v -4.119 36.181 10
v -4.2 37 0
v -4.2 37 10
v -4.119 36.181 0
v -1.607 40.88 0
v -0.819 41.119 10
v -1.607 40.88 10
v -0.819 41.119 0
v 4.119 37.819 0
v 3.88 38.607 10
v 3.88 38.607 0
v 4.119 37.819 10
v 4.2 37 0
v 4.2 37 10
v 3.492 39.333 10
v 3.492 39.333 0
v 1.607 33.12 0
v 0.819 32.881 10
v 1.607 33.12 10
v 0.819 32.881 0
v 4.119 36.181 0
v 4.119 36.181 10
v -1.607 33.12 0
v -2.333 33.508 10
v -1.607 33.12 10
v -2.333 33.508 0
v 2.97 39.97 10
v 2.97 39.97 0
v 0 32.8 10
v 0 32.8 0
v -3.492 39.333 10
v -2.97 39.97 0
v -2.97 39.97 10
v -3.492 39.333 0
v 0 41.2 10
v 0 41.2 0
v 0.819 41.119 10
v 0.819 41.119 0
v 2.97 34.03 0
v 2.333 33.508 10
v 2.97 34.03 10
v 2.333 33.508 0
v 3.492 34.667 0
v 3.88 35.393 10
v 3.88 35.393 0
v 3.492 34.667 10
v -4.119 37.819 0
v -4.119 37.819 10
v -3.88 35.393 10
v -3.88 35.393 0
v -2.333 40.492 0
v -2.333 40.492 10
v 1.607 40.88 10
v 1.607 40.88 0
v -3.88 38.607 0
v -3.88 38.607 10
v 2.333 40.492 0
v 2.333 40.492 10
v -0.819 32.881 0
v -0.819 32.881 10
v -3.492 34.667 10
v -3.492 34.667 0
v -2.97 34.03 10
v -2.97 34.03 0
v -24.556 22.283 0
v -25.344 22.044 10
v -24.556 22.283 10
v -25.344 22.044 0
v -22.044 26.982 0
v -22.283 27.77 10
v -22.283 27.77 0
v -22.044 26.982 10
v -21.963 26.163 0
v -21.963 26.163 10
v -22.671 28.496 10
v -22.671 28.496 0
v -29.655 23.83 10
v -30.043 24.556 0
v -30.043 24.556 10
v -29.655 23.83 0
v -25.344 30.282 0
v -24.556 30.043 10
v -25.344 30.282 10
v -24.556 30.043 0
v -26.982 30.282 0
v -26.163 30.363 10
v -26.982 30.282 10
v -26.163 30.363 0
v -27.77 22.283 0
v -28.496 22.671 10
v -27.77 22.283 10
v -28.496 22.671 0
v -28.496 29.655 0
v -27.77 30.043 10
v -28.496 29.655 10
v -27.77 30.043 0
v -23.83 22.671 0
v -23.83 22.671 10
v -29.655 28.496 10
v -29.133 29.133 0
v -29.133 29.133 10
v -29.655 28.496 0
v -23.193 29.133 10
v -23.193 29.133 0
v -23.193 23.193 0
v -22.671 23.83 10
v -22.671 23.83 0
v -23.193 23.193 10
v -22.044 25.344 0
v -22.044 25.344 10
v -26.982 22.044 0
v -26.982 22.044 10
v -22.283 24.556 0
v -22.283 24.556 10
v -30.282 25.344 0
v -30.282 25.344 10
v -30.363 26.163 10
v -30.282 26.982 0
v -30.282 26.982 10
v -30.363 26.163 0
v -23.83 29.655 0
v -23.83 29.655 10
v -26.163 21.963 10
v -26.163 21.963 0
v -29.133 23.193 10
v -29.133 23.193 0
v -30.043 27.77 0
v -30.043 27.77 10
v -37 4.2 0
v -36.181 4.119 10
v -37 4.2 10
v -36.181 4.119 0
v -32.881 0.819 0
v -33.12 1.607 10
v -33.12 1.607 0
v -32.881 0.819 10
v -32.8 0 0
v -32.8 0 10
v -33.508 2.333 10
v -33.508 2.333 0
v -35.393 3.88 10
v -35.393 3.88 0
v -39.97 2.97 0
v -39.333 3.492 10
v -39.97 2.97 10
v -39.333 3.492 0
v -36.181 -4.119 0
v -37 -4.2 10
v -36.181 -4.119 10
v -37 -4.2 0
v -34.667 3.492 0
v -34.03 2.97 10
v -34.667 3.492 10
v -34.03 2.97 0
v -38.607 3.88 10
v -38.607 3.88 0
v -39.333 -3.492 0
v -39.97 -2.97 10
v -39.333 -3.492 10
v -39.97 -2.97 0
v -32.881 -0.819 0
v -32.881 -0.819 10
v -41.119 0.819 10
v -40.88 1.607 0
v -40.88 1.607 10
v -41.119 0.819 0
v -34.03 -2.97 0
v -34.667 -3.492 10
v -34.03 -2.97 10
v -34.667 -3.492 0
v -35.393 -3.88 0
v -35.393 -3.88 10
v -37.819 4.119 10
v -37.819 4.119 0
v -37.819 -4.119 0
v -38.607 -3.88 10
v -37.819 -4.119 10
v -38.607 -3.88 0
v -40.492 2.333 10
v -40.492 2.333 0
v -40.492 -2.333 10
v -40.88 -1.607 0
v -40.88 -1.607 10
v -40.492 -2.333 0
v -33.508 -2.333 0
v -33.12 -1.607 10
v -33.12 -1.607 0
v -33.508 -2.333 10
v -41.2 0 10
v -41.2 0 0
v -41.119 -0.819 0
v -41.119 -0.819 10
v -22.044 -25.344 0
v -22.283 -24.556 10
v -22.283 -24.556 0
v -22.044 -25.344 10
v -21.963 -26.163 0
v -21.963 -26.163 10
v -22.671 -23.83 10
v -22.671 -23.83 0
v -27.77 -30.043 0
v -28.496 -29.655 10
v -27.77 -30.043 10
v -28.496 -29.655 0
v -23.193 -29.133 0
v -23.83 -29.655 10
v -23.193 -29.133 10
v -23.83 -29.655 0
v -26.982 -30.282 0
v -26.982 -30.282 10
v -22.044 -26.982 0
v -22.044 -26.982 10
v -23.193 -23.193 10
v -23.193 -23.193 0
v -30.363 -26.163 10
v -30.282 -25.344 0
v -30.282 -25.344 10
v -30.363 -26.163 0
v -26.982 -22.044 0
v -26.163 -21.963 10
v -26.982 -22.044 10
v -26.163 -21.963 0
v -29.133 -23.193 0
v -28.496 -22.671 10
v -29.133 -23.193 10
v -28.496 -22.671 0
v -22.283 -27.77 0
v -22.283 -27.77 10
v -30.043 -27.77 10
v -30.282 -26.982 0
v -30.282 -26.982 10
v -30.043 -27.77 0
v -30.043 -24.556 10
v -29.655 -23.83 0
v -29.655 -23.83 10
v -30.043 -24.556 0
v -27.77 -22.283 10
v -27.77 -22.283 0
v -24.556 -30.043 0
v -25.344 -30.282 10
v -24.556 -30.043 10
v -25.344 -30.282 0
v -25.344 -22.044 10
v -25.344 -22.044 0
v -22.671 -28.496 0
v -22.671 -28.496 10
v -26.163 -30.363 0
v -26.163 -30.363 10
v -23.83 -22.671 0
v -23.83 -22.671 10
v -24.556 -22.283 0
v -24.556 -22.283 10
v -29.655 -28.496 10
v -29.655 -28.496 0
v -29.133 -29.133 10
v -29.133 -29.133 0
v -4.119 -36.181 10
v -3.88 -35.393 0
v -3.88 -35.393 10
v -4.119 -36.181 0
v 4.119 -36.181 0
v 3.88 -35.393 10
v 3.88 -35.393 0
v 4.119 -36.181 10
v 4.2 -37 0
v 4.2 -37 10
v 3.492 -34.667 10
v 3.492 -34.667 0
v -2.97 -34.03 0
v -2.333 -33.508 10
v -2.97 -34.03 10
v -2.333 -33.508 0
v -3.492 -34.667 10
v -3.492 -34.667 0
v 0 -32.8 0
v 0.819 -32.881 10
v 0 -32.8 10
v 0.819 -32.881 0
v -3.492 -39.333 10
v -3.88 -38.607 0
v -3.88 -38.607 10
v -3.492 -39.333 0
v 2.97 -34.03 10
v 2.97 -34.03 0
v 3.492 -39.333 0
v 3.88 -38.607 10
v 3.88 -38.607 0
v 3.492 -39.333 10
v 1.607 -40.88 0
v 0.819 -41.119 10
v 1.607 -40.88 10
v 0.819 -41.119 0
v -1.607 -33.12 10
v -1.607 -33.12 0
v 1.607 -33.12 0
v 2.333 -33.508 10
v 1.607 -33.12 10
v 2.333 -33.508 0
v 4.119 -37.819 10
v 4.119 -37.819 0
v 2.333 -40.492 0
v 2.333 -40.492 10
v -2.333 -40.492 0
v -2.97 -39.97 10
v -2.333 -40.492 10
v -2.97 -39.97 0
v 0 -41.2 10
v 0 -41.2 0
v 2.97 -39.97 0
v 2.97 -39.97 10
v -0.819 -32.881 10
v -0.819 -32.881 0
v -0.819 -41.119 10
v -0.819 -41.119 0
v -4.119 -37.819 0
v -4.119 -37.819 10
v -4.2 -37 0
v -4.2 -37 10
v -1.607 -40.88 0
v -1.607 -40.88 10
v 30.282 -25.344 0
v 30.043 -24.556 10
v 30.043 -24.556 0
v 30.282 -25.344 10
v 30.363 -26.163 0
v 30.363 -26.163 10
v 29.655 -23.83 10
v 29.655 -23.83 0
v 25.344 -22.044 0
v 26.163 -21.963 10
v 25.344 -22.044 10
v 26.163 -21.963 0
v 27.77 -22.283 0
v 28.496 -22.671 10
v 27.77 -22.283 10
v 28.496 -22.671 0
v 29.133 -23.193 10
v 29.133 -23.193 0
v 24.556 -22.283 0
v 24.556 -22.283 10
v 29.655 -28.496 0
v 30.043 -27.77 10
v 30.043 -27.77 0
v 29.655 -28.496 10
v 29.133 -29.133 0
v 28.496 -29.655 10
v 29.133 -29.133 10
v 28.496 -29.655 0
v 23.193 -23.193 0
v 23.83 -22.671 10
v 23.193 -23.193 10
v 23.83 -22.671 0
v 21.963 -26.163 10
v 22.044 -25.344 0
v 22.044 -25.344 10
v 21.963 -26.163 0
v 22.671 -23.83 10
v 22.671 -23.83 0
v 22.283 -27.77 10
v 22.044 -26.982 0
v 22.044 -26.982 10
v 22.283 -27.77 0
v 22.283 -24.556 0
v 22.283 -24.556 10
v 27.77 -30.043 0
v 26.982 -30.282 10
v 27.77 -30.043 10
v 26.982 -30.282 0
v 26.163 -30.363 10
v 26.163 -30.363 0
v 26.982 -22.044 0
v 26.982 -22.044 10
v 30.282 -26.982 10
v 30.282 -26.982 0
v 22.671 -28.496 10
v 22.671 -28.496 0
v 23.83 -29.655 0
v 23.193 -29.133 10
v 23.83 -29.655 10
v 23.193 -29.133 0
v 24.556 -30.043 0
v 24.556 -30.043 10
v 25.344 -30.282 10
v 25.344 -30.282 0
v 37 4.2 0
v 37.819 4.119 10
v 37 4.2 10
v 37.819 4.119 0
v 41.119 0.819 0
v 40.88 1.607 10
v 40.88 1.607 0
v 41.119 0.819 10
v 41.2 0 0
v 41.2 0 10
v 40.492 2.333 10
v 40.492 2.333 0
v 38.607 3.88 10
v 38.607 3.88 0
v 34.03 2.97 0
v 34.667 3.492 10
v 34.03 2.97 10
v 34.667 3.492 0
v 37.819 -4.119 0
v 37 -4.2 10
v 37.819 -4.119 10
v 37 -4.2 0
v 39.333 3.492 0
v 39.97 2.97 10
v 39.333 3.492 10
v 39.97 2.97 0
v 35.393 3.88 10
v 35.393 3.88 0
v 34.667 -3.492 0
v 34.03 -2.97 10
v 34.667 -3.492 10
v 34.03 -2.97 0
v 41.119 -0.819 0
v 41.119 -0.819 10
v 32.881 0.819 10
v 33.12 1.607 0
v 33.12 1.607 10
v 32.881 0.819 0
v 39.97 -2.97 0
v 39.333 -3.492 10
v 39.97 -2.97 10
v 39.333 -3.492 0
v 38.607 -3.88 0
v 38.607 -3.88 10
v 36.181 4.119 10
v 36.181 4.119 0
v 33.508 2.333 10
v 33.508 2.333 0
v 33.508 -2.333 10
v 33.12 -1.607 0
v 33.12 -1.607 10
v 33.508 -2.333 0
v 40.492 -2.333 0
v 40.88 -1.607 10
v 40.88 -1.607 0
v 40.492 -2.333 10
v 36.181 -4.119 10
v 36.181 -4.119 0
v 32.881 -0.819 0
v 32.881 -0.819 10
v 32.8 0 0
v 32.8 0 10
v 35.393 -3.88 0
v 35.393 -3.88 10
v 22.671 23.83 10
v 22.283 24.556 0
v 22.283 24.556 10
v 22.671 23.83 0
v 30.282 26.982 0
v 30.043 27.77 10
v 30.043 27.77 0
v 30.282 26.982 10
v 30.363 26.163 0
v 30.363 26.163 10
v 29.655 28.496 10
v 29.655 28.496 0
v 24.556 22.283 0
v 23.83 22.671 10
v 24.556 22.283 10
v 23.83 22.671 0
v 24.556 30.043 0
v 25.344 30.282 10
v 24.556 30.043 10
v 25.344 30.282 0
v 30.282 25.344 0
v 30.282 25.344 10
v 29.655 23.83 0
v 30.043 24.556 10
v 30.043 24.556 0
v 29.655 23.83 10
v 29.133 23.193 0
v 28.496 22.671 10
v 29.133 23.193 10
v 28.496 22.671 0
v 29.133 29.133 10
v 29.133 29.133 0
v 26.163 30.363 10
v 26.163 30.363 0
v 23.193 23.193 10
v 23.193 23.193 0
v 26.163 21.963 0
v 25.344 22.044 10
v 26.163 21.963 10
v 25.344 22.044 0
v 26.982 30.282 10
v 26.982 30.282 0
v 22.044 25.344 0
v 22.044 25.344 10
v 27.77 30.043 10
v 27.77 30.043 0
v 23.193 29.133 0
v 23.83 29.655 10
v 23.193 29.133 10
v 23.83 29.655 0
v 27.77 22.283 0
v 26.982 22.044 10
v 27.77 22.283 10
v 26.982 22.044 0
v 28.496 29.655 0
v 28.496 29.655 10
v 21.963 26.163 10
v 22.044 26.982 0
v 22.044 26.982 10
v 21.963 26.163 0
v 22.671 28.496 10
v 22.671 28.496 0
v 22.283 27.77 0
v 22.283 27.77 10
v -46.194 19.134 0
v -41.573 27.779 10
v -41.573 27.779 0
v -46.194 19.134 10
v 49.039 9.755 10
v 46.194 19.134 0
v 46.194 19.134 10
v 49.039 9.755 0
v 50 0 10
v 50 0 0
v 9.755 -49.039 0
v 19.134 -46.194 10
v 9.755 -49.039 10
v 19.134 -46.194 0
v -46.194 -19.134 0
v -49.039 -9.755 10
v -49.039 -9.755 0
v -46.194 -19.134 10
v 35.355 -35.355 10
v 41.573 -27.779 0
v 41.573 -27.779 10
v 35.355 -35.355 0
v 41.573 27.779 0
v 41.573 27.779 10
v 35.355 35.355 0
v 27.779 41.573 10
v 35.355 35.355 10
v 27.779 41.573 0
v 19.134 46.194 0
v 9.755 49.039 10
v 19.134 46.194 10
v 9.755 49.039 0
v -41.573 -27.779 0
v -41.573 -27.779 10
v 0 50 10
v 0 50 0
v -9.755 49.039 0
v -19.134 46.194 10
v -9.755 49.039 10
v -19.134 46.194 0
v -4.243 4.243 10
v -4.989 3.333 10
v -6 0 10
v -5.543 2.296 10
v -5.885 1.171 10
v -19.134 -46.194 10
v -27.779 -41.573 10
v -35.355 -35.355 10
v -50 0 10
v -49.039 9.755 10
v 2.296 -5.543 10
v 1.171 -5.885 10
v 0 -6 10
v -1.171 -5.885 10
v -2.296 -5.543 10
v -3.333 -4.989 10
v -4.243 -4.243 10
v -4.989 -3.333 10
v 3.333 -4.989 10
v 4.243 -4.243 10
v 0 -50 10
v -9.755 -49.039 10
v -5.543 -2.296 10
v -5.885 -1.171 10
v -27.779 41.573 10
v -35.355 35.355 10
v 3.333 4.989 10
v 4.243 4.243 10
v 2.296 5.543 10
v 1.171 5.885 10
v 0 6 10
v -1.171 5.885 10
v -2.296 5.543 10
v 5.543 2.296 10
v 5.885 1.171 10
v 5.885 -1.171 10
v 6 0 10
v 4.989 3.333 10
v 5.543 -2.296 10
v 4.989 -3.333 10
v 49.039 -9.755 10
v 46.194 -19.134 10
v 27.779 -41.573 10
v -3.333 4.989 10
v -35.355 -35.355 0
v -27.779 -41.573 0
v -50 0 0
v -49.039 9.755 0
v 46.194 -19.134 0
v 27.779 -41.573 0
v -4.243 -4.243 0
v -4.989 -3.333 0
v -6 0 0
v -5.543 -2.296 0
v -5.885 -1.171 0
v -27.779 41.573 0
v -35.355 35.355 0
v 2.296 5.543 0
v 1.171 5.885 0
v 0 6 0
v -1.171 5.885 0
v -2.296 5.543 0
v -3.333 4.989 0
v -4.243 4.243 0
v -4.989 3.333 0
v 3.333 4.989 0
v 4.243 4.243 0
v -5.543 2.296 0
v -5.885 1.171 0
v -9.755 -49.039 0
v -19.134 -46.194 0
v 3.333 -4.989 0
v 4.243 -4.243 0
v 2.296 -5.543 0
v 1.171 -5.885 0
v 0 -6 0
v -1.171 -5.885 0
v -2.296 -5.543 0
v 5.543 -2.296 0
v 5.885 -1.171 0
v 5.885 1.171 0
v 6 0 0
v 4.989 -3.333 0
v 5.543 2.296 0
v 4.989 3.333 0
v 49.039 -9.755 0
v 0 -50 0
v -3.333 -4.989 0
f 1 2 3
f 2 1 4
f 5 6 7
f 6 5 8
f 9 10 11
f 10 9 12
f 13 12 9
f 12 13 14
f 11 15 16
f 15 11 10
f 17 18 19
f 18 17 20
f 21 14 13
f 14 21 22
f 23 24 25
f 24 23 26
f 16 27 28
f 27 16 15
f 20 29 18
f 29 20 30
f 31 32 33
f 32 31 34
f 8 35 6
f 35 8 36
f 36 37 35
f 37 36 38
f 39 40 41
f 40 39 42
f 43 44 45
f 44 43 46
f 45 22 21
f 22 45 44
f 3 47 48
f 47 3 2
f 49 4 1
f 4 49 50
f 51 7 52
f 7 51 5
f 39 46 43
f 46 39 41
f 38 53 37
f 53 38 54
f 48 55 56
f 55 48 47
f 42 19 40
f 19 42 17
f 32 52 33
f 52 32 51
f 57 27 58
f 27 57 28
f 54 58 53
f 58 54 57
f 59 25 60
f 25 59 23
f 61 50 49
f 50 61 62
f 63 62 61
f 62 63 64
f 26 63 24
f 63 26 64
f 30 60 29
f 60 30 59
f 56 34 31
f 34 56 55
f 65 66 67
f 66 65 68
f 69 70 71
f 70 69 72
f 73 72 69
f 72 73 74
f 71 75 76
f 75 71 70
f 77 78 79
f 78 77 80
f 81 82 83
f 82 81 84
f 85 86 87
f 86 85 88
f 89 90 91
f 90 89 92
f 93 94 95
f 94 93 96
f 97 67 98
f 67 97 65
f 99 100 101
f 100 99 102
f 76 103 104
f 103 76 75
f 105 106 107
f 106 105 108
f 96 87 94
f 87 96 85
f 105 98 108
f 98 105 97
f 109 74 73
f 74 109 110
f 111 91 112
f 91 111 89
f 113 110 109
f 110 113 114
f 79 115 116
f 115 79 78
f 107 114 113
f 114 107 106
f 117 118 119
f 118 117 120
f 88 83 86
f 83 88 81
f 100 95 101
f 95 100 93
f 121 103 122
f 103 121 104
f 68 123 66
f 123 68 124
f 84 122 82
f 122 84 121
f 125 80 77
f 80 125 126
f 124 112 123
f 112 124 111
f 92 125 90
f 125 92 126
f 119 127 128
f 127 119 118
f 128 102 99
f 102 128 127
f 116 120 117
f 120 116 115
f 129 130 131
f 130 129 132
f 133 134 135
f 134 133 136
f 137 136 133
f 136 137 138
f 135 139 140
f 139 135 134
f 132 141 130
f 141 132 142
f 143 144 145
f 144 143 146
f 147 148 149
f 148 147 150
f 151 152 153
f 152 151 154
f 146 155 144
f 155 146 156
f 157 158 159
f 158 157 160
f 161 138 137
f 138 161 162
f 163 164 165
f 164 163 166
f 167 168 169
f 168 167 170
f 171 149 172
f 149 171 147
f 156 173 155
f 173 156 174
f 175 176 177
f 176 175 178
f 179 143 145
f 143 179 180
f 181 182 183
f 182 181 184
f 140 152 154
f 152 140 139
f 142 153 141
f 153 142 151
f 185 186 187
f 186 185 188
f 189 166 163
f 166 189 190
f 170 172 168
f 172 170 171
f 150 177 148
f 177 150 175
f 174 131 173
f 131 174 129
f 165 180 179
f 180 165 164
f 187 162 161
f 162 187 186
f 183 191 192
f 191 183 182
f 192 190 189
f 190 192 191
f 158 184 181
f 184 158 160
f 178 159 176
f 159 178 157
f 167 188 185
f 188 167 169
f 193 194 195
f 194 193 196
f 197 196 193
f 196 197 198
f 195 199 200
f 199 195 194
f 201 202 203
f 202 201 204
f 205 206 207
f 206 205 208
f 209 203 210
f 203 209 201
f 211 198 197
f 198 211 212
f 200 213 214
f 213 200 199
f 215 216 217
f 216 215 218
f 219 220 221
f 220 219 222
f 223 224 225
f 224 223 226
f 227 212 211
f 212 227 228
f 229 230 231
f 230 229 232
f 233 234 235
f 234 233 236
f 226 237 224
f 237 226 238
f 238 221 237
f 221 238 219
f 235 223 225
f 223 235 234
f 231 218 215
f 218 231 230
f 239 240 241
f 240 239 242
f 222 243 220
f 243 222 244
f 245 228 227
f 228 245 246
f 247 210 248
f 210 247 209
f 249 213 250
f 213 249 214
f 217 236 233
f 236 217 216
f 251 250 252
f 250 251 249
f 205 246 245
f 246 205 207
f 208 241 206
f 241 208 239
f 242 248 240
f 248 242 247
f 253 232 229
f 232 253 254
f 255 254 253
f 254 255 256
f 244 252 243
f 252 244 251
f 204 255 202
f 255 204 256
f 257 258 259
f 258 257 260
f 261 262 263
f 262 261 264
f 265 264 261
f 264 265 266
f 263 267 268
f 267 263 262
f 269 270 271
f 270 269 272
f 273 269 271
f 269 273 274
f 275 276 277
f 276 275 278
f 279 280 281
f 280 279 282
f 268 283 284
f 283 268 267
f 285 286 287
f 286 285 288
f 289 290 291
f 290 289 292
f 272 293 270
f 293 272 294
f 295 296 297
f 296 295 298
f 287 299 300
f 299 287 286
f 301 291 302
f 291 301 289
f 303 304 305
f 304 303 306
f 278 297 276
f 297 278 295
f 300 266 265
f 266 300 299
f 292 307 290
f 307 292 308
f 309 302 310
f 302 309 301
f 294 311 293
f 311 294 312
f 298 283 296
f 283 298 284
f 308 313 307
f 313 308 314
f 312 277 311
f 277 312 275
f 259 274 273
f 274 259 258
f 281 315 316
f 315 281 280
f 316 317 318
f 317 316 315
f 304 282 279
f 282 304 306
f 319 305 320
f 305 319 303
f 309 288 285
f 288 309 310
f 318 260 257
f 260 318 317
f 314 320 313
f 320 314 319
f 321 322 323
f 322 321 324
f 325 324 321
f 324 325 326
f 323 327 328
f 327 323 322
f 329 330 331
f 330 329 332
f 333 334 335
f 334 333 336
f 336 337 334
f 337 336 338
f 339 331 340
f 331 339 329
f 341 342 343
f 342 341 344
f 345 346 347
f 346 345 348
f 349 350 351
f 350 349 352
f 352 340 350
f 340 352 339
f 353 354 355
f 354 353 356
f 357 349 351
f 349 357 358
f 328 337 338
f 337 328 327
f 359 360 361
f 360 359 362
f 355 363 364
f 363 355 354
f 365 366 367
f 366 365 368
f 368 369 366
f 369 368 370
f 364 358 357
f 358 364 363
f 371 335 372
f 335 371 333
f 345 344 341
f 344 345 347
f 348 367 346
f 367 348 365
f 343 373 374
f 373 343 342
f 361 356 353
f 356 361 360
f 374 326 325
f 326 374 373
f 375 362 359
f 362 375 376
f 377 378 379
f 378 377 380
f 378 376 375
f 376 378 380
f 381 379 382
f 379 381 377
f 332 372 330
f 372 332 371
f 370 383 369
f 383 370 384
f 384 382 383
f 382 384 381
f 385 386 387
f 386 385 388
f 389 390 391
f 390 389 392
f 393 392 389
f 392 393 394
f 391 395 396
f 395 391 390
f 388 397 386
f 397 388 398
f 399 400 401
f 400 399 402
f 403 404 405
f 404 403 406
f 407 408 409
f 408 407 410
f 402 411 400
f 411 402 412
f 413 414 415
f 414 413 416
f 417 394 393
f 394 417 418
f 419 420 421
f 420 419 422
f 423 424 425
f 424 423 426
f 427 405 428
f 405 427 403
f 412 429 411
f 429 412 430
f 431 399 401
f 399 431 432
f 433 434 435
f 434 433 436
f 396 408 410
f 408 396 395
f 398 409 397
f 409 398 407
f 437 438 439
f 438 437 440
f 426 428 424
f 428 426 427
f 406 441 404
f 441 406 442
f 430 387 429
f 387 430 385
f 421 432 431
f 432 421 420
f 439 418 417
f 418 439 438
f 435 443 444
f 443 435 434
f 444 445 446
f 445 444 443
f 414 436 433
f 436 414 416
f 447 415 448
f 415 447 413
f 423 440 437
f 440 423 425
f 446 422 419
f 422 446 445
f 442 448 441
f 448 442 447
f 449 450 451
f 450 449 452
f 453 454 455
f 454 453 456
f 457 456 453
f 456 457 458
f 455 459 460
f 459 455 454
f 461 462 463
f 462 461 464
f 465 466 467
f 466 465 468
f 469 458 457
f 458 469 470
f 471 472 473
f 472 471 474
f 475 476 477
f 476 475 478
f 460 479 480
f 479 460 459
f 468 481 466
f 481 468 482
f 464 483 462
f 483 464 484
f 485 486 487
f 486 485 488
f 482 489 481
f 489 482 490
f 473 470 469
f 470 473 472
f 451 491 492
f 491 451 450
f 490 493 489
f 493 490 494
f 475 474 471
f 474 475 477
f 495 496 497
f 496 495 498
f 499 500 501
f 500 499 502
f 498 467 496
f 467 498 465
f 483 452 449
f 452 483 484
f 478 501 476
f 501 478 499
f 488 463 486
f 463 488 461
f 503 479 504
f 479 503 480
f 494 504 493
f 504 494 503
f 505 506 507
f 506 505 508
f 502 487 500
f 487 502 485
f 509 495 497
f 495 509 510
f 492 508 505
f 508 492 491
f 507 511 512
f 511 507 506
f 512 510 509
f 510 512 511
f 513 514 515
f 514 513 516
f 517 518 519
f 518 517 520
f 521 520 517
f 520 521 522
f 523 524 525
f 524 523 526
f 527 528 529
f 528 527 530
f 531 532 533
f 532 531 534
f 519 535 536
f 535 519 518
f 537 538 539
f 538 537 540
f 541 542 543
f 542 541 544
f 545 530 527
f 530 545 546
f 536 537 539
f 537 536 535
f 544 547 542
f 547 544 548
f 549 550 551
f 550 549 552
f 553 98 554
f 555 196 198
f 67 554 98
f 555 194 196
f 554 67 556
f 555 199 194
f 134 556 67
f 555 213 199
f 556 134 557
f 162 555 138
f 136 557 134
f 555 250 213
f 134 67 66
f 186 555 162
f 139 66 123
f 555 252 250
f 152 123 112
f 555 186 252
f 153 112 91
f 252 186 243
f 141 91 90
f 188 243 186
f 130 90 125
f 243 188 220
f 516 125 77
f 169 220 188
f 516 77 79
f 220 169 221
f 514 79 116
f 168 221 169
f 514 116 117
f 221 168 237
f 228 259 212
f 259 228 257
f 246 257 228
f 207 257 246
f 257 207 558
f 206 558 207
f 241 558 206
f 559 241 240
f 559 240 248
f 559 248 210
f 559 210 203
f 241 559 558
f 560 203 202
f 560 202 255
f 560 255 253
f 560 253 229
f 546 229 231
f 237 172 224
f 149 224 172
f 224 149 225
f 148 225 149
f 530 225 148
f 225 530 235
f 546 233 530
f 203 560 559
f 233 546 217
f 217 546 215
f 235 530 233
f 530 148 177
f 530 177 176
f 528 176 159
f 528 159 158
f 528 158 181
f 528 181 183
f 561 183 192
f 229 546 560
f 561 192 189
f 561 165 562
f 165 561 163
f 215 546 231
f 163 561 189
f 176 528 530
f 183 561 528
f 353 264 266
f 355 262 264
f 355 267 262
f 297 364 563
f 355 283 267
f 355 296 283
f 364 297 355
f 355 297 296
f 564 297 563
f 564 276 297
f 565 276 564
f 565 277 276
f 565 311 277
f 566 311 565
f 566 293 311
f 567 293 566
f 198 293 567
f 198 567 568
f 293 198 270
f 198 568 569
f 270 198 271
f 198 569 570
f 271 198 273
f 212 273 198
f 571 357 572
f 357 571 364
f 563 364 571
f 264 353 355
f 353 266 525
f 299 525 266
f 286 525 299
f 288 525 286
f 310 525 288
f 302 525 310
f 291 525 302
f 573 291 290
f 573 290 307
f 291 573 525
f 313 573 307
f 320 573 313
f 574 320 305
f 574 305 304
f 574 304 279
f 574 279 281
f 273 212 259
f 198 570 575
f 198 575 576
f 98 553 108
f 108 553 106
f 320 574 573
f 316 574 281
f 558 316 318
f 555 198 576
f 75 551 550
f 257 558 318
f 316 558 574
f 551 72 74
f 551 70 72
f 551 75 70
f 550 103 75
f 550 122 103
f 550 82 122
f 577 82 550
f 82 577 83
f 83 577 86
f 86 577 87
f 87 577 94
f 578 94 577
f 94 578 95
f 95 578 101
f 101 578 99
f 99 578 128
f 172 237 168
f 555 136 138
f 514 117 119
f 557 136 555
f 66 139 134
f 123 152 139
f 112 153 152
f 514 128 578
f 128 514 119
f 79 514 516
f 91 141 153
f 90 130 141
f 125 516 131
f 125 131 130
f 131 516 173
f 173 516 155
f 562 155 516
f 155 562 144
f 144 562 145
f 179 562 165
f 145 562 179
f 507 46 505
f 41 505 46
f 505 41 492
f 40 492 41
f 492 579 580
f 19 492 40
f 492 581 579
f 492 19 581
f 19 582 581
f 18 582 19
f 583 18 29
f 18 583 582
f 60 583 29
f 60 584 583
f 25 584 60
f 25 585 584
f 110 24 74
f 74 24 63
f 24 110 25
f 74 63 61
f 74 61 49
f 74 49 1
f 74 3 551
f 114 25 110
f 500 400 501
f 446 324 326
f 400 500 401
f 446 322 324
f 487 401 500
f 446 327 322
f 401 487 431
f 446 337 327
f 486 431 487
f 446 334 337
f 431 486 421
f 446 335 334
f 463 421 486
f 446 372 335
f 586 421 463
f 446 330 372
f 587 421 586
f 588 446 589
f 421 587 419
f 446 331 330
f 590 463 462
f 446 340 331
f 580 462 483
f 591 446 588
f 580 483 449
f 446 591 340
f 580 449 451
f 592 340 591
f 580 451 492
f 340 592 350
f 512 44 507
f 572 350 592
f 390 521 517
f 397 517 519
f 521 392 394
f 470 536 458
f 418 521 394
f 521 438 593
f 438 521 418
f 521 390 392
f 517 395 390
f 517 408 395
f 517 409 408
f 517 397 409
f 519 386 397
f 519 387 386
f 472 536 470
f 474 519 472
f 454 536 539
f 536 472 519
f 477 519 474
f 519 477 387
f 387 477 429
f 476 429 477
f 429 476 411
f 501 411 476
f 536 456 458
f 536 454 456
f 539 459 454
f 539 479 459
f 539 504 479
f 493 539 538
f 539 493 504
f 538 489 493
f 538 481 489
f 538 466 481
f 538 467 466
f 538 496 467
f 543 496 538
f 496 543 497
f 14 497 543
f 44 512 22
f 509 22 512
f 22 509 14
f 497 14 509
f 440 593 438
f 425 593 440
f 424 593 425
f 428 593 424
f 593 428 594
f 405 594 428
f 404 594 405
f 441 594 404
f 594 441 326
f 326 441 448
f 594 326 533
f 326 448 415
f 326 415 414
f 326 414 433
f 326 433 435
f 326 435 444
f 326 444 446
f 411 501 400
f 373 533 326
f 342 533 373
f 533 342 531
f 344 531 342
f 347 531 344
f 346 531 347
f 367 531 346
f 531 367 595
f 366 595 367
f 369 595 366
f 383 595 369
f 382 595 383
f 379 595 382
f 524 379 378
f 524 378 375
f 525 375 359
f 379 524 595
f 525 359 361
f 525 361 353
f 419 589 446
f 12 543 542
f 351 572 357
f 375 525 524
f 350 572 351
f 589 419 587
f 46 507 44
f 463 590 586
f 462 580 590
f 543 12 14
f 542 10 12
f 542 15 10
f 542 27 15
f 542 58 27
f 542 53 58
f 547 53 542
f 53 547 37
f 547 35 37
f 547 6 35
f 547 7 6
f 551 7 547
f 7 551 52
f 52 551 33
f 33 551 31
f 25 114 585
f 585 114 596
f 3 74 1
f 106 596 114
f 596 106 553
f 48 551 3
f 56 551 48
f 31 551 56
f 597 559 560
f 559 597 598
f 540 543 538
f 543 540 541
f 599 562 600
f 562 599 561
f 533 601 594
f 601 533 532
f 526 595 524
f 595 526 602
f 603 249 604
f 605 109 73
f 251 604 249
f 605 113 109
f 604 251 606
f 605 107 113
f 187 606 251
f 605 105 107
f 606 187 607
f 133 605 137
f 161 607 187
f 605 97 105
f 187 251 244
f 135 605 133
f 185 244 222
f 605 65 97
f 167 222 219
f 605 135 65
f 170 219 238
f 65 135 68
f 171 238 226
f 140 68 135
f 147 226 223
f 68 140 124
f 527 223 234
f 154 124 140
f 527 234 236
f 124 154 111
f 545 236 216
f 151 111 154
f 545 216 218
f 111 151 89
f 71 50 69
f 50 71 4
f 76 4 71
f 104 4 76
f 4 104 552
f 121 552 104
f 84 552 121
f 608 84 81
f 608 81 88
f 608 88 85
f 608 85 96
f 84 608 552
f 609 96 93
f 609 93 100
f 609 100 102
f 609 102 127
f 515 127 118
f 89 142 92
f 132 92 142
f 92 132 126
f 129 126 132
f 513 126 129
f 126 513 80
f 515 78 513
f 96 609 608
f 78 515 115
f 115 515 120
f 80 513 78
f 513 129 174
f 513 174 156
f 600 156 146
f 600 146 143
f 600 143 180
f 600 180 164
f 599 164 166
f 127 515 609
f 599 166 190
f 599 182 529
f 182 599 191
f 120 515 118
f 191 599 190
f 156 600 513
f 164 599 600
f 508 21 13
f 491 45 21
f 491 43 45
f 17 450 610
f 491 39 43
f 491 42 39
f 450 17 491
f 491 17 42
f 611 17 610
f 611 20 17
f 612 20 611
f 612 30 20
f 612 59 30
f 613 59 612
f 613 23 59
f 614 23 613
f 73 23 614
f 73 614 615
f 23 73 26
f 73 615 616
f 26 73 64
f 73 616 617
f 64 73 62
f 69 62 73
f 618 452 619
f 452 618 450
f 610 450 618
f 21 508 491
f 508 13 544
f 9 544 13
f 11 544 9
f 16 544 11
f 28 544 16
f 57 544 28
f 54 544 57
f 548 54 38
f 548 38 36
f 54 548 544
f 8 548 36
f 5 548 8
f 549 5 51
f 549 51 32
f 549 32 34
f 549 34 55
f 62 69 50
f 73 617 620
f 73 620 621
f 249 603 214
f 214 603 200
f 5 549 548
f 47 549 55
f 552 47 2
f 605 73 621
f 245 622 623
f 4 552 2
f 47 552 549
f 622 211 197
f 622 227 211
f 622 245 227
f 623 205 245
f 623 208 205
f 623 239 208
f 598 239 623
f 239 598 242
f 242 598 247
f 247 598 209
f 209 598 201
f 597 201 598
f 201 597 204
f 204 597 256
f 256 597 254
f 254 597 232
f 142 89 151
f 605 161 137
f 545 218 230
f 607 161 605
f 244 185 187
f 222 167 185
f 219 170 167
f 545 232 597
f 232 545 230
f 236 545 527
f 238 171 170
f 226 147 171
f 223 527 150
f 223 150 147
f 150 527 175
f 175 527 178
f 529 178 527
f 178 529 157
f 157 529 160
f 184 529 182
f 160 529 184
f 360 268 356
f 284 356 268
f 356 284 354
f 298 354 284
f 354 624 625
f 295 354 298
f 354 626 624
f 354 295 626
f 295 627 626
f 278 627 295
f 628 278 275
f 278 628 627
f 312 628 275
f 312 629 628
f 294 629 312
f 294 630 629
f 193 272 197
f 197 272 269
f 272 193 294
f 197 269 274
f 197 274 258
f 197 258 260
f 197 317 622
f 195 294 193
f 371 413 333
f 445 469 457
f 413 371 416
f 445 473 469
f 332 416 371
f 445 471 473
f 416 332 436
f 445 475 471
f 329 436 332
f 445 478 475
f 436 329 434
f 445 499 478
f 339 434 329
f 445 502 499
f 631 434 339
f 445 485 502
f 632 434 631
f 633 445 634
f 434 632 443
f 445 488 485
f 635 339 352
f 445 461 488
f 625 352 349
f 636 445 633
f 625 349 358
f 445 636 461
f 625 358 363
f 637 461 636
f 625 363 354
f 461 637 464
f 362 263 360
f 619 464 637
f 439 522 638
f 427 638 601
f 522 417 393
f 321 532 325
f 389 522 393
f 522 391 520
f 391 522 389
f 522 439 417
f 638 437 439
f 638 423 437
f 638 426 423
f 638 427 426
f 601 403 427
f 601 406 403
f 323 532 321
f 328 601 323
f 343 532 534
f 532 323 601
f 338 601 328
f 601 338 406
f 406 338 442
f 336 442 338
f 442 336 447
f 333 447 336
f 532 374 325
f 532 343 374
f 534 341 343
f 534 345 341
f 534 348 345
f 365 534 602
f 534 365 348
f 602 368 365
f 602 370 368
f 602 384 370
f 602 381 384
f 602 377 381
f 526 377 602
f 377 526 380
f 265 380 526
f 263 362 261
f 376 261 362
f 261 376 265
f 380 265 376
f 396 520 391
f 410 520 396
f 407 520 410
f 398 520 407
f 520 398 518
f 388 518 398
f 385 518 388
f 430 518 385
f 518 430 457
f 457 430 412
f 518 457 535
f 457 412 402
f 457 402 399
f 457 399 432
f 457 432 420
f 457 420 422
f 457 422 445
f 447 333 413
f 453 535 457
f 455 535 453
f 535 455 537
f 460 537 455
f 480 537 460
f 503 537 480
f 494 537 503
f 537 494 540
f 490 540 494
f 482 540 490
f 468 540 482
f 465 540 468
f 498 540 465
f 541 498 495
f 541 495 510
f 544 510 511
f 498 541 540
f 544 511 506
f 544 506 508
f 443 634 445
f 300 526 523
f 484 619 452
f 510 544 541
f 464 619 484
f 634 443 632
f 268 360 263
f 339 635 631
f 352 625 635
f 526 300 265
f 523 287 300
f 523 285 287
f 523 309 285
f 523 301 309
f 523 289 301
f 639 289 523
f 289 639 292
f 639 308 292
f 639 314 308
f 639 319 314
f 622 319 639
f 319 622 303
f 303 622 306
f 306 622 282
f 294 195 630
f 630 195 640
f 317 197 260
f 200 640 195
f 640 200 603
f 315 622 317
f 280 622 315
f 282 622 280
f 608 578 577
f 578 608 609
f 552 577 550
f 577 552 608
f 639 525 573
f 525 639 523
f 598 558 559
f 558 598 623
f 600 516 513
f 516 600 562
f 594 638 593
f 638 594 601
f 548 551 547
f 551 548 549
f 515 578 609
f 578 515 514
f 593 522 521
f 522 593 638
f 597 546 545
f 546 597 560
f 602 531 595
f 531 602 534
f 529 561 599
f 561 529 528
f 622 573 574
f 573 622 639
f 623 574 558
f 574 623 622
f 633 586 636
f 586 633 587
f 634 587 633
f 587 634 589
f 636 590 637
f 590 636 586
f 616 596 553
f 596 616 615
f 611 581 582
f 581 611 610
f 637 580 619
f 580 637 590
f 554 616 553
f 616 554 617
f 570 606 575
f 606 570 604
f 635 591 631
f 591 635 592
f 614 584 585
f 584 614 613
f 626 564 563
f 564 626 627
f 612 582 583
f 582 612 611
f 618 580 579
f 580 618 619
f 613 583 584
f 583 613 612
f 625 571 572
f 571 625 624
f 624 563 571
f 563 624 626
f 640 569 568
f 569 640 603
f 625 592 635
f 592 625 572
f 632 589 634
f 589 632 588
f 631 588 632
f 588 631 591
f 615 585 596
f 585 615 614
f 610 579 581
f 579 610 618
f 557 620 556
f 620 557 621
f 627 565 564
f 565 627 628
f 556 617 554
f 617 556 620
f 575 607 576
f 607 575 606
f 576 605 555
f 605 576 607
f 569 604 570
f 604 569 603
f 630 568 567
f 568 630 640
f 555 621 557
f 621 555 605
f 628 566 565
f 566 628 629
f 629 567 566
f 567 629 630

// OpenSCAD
$fn = 32;

// ----------------------------------------------------------------------
// Flange Ø100 x 10
// 8 holes on a Ø74 bolt circle, bolted joints
// ----------------------------------------------------------------------

// --- parameters (mm) ---
flange_d = 100;  // outside diameter of the flange
thickness = 10;  // flange thickness
holes = 8;       // number of bolt holes
pcd = 74;        // bolt circle diameter
start_deg = 90;  // angle of the first hole, from +X
hole_d = 8.4;    // bolt hole diameter
bore_d = 12;     // central through bore
hub_d = 20;      // hub outside diameter
hub_h = 0;       // hub height above the flange face (0 = no hub)

// --- derived feature positions (mm) ---
height = thickness + hub_h;  // = 10   overall height of the part
pcd_r = pcd / 2;             // = 37   bolt circle radius
hole_step = 360 / holes;     // = 45   angular pitch
feature_centers = [
  [pcd_r * cos(start_deg + 0 * hole_step), pcd_r * sin(start_deg + 0 * hole_step)],
  [pcd_r * cos(start_deg + 1 * hole_step), pcd_r * sin(start_deg + 1 * hole_step)],
  [pcd_r * cos(start_deg + 2 * hole_step), pcd_r * sin(start_deg + 2 * hole_step)],
  [pcd_r * cos(start_deg + 3 * hole_step), pcd_r * sin(start_deg + 3 * hole_step)],
  [pcd_r * cos(start_deg + 4 * hole_step), pcd_r * sin(start_deg + 4 * hole_step)],
  [pcd_r * cos(start_deg + 5 * hole_step), pcd_r * sin(start_deg + 5 * hole_step)],
  [pcd_r * cos(start_deg + 6 * hole_step), pcd_r * sin(start_deg + 6 * hole_step)],
  [pcd_r * cos(start_deg + 7 * hole_step), pcd_r * sin(start_deg + 7 * hole_step)]
];   // bolt hole centres on the pitch circle

// flange disc, every hole and the bore cut straight through
difference() {
  union() {
    cylinder(d = flange_d, h = thickness);
  }
  translate([0, 0, -1]) cylinder(d = bore_d, h = height + 2);  // bore, through
  for (centre = feature_centers)
    translate([centre[0], centre[1], -1]) cylinder(d = hole_d, h = thickness + 2);
}
